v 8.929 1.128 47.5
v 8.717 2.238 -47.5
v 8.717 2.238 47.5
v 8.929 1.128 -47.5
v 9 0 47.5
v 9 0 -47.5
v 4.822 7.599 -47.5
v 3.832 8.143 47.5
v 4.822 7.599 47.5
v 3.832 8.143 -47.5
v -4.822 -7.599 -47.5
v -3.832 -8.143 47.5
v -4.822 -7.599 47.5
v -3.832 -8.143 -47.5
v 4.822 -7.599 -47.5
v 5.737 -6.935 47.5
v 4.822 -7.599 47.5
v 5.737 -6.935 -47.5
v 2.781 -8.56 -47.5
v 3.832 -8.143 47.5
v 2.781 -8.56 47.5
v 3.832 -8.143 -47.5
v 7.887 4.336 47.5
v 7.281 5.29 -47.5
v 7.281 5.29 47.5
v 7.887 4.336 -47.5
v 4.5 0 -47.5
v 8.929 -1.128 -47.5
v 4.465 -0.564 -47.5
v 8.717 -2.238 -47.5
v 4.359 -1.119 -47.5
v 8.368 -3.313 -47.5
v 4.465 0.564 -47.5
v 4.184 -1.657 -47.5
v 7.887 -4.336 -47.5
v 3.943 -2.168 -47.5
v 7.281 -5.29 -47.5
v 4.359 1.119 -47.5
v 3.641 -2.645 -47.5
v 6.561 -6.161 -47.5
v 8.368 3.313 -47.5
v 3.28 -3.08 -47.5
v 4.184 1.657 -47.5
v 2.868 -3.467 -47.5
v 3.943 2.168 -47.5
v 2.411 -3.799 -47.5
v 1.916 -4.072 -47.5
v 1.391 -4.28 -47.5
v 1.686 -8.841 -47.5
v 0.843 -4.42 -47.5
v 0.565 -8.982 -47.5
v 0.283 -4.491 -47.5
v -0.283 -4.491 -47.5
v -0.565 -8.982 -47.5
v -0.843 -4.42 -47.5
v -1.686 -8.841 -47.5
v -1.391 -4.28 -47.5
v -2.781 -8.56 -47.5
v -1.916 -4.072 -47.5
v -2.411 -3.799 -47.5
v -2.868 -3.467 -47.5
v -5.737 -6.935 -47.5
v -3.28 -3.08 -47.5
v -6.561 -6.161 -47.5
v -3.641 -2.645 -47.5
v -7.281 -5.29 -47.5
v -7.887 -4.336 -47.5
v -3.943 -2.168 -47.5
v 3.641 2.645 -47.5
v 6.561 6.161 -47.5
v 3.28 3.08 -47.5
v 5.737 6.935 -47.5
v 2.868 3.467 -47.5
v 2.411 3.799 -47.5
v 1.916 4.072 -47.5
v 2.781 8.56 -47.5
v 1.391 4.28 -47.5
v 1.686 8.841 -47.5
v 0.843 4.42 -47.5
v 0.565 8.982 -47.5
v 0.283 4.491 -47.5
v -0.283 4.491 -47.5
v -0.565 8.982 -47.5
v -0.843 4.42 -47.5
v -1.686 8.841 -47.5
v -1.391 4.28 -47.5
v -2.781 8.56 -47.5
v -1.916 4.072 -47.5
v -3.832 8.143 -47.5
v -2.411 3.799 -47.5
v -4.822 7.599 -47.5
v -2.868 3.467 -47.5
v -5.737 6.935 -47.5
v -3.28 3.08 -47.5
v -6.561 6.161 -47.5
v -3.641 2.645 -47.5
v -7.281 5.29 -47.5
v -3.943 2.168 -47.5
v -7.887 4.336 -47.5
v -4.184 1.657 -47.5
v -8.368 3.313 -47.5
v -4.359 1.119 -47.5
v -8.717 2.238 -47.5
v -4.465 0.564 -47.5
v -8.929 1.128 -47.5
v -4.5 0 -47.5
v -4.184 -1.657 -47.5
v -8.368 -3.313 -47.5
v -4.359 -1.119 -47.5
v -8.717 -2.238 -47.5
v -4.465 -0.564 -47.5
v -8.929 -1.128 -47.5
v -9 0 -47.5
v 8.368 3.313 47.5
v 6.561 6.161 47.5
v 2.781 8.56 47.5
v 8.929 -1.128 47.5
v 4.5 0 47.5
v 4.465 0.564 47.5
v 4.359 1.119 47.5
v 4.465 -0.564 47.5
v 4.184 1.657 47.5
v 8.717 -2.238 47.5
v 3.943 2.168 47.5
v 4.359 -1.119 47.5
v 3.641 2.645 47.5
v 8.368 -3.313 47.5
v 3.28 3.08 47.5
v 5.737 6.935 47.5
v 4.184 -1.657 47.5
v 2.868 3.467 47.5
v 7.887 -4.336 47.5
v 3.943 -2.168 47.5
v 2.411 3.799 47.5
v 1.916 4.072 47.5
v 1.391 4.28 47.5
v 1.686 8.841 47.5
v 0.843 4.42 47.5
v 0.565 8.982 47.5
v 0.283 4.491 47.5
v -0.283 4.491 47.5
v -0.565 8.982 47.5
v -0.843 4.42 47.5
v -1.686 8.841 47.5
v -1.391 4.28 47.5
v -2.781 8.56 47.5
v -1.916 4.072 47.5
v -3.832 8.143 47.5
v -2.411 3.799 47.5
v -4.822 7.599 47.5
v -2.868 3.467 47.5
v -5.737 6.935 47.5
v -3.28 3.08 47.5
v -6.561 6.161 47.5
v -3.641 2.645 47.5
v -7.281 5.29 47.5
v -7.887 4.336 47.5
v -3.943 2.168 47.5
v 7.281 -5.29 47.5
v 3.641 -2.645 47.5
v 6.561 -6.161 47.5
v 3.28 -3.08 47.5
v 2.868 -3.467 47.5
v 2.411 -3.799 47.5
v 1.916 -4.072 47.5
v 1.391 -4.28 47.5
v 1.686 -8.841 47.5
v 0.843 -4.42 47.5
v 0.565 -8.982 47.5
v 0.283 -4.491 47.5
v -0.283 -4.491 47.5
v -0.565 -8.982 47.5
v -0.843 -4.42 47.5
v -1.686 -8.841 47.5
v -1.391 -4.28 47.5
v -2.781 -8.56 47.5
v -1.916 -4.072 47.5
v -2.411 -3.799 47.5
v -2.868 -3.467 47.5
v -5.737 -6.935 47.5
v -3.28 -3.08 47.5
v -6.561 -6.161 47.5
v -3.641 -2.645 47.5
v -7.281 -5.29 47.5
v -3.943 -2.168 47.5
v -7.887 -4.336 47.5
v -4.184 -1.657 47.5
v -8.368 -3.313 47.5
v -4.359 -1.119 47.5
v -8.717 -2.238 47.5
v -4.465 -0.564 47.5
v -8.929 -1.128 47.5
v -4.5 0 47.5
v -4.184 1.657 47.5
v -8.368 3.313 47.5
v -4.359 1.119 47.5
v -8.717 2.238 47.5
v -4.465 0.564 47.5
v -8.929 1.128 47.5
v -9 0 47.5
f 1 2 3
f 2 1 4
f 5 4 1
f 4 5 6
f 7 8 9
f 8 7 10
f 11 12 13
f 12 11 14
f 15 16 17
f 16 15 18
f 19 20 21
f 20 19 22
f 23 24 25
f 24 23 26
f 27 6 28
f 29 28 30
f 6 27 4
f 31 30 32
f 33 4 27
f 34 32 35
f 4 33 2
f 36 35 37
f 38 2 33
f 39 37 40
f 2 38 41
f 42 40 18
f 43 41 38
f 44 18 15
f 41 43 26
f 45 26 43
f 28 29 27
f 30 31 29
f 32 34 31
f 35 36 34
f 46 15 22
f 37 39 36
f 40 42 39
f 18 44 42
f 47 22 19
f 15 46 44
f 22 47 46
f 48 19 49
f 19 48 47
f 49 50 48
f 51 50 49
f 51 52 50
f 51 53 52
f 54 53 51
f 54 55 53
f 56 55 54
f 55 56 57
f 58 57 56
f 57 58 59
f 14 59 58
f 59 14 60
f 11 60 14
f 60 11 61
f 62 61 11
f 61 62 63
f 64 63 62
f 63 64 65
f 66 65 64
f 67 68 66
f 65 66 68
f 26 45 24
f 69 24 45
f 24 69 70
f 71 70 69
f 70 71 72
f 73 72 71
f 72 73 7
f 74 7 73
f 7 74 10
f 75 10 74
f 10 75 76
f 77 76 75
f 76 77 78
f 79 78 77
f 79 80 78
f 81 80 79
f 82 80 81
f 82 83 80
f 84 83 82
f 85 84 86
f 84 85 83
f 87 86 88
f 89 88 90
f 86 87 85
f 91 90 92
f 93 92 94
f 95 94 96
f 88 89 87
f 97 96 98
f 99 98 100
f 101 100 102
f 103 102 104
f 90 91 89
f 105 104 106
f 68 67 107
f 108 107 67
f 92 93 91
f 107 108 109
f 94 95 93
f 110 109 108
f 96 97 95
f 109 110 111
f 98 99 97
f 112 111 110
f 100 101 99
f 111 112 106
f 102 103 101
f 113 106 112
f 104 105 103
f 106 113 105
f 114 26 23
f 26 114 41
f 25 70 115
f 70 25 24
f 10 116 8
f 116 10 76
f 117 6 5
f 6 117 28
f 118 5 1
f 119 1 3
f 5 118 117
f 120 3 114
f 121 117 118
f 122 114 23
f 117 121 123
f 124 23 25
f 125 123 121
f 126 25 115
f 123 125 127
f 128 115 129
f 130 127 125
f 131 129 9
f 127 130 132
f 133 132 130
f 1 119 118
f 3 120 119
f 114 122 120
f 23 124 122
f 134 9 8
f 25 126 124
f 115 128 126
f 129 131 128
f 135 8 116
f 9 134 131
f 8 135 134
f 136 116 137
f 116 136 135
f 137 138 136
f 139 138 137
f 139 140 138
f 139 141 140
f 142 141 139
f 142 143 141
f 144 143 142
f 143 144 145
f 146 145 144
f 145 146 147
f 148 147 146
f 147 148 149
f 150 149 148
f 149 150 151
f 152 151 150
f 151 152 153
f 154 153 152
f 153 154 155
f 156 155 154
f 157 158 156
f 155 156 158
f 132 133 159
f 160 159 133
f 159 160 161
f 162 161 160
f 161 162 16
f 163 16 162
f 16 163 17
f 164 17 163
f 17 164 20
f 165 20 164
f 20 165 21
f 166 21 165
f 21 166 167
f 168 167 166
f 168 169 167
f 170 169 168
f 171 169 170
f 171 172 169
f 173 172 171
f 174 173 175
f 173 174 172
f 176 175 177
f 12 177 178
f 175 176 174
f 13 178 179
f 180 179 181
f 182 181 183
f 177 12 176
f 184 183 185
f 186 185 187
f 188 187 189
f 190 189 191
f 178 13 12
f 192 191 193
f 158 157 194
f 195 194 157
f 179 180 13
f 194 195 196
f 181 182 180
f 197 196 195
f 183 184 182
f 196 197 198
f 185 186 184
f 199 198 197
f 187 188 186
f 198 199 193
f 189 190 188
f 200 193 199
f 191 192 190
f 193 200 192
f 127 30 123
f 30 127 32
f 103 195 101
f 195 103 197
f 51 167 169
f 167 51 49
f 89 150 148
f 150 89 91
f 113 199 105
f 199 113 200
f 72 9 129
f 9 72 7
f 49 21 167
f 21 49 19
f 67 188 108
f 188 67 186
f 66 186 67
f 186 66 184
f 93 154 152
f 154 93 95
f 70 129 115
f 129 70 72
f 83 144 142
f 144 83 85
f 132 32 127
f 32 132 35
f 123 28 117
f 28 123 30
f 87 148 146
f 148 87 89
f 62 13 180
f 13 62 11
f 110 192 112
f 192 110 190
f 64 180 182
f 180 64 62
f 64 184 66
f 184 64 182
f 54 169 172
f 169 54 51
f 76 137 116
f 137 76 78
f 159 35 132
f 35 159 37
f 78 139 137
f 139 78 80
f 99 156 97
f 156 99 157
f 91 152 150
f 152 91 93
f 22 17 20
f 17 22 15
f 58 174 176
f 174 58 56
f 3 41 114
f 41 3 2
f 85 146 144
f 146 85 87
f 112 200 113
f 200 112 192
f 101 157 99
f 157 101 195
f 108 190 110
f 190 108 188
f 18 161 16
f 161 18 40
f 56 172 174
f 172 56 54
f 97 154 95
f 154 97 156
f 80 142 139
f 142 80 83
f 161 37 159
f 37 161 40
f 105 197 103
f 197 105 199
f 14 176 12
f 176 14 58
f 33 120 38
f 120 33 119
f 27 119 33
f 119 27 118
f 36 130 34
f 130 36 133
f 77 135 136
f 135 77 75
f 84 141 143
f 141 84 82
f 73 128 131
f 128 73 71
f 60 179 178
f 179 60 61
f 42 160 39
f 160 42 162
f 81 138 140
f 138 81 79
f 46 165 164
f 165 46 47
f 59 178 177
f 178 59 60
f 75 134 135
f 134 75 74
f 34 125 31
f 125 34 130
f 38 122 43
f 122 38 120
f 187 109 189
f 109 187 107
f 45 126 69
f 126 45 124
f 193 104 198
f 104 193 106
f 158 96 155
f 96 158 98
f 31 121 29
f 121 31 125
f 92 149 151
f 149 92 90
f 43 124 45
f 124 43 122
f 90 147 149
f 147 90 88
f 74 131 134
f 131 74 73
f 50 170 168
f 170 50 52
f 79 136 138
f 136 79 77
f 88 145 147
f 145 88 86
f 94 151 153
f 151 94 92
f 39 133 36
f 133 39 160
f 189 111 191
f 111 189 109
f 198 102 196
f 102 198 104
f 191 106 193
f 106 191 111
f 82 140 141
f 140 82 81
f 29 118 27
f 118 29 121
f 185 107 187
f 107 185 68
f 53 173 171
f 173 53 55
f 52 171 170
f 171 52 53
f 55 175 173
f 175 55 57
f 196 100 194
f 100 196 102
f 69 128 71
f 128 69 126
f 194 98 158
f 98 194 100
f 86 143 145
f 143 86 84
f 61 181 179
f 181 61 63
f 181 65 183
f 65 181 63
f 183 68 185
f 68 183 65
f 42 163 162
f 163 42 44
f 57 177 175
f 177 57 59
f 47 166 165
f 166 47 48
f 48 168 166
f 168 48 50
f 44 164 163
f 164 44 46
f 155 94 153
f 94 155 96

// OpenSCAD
$fn = 50;


difference() {
	union() {
		translate(v = [0, 0, -47.5000000000]) {
			cylinder(h = 95, r = 9.0000000000);
		}
	}
	union() {
		translate(v = [0, 0, -100.0000000000]) {
			cylinder(h = 200, r = 4.5000000000);
		}
	}
}
